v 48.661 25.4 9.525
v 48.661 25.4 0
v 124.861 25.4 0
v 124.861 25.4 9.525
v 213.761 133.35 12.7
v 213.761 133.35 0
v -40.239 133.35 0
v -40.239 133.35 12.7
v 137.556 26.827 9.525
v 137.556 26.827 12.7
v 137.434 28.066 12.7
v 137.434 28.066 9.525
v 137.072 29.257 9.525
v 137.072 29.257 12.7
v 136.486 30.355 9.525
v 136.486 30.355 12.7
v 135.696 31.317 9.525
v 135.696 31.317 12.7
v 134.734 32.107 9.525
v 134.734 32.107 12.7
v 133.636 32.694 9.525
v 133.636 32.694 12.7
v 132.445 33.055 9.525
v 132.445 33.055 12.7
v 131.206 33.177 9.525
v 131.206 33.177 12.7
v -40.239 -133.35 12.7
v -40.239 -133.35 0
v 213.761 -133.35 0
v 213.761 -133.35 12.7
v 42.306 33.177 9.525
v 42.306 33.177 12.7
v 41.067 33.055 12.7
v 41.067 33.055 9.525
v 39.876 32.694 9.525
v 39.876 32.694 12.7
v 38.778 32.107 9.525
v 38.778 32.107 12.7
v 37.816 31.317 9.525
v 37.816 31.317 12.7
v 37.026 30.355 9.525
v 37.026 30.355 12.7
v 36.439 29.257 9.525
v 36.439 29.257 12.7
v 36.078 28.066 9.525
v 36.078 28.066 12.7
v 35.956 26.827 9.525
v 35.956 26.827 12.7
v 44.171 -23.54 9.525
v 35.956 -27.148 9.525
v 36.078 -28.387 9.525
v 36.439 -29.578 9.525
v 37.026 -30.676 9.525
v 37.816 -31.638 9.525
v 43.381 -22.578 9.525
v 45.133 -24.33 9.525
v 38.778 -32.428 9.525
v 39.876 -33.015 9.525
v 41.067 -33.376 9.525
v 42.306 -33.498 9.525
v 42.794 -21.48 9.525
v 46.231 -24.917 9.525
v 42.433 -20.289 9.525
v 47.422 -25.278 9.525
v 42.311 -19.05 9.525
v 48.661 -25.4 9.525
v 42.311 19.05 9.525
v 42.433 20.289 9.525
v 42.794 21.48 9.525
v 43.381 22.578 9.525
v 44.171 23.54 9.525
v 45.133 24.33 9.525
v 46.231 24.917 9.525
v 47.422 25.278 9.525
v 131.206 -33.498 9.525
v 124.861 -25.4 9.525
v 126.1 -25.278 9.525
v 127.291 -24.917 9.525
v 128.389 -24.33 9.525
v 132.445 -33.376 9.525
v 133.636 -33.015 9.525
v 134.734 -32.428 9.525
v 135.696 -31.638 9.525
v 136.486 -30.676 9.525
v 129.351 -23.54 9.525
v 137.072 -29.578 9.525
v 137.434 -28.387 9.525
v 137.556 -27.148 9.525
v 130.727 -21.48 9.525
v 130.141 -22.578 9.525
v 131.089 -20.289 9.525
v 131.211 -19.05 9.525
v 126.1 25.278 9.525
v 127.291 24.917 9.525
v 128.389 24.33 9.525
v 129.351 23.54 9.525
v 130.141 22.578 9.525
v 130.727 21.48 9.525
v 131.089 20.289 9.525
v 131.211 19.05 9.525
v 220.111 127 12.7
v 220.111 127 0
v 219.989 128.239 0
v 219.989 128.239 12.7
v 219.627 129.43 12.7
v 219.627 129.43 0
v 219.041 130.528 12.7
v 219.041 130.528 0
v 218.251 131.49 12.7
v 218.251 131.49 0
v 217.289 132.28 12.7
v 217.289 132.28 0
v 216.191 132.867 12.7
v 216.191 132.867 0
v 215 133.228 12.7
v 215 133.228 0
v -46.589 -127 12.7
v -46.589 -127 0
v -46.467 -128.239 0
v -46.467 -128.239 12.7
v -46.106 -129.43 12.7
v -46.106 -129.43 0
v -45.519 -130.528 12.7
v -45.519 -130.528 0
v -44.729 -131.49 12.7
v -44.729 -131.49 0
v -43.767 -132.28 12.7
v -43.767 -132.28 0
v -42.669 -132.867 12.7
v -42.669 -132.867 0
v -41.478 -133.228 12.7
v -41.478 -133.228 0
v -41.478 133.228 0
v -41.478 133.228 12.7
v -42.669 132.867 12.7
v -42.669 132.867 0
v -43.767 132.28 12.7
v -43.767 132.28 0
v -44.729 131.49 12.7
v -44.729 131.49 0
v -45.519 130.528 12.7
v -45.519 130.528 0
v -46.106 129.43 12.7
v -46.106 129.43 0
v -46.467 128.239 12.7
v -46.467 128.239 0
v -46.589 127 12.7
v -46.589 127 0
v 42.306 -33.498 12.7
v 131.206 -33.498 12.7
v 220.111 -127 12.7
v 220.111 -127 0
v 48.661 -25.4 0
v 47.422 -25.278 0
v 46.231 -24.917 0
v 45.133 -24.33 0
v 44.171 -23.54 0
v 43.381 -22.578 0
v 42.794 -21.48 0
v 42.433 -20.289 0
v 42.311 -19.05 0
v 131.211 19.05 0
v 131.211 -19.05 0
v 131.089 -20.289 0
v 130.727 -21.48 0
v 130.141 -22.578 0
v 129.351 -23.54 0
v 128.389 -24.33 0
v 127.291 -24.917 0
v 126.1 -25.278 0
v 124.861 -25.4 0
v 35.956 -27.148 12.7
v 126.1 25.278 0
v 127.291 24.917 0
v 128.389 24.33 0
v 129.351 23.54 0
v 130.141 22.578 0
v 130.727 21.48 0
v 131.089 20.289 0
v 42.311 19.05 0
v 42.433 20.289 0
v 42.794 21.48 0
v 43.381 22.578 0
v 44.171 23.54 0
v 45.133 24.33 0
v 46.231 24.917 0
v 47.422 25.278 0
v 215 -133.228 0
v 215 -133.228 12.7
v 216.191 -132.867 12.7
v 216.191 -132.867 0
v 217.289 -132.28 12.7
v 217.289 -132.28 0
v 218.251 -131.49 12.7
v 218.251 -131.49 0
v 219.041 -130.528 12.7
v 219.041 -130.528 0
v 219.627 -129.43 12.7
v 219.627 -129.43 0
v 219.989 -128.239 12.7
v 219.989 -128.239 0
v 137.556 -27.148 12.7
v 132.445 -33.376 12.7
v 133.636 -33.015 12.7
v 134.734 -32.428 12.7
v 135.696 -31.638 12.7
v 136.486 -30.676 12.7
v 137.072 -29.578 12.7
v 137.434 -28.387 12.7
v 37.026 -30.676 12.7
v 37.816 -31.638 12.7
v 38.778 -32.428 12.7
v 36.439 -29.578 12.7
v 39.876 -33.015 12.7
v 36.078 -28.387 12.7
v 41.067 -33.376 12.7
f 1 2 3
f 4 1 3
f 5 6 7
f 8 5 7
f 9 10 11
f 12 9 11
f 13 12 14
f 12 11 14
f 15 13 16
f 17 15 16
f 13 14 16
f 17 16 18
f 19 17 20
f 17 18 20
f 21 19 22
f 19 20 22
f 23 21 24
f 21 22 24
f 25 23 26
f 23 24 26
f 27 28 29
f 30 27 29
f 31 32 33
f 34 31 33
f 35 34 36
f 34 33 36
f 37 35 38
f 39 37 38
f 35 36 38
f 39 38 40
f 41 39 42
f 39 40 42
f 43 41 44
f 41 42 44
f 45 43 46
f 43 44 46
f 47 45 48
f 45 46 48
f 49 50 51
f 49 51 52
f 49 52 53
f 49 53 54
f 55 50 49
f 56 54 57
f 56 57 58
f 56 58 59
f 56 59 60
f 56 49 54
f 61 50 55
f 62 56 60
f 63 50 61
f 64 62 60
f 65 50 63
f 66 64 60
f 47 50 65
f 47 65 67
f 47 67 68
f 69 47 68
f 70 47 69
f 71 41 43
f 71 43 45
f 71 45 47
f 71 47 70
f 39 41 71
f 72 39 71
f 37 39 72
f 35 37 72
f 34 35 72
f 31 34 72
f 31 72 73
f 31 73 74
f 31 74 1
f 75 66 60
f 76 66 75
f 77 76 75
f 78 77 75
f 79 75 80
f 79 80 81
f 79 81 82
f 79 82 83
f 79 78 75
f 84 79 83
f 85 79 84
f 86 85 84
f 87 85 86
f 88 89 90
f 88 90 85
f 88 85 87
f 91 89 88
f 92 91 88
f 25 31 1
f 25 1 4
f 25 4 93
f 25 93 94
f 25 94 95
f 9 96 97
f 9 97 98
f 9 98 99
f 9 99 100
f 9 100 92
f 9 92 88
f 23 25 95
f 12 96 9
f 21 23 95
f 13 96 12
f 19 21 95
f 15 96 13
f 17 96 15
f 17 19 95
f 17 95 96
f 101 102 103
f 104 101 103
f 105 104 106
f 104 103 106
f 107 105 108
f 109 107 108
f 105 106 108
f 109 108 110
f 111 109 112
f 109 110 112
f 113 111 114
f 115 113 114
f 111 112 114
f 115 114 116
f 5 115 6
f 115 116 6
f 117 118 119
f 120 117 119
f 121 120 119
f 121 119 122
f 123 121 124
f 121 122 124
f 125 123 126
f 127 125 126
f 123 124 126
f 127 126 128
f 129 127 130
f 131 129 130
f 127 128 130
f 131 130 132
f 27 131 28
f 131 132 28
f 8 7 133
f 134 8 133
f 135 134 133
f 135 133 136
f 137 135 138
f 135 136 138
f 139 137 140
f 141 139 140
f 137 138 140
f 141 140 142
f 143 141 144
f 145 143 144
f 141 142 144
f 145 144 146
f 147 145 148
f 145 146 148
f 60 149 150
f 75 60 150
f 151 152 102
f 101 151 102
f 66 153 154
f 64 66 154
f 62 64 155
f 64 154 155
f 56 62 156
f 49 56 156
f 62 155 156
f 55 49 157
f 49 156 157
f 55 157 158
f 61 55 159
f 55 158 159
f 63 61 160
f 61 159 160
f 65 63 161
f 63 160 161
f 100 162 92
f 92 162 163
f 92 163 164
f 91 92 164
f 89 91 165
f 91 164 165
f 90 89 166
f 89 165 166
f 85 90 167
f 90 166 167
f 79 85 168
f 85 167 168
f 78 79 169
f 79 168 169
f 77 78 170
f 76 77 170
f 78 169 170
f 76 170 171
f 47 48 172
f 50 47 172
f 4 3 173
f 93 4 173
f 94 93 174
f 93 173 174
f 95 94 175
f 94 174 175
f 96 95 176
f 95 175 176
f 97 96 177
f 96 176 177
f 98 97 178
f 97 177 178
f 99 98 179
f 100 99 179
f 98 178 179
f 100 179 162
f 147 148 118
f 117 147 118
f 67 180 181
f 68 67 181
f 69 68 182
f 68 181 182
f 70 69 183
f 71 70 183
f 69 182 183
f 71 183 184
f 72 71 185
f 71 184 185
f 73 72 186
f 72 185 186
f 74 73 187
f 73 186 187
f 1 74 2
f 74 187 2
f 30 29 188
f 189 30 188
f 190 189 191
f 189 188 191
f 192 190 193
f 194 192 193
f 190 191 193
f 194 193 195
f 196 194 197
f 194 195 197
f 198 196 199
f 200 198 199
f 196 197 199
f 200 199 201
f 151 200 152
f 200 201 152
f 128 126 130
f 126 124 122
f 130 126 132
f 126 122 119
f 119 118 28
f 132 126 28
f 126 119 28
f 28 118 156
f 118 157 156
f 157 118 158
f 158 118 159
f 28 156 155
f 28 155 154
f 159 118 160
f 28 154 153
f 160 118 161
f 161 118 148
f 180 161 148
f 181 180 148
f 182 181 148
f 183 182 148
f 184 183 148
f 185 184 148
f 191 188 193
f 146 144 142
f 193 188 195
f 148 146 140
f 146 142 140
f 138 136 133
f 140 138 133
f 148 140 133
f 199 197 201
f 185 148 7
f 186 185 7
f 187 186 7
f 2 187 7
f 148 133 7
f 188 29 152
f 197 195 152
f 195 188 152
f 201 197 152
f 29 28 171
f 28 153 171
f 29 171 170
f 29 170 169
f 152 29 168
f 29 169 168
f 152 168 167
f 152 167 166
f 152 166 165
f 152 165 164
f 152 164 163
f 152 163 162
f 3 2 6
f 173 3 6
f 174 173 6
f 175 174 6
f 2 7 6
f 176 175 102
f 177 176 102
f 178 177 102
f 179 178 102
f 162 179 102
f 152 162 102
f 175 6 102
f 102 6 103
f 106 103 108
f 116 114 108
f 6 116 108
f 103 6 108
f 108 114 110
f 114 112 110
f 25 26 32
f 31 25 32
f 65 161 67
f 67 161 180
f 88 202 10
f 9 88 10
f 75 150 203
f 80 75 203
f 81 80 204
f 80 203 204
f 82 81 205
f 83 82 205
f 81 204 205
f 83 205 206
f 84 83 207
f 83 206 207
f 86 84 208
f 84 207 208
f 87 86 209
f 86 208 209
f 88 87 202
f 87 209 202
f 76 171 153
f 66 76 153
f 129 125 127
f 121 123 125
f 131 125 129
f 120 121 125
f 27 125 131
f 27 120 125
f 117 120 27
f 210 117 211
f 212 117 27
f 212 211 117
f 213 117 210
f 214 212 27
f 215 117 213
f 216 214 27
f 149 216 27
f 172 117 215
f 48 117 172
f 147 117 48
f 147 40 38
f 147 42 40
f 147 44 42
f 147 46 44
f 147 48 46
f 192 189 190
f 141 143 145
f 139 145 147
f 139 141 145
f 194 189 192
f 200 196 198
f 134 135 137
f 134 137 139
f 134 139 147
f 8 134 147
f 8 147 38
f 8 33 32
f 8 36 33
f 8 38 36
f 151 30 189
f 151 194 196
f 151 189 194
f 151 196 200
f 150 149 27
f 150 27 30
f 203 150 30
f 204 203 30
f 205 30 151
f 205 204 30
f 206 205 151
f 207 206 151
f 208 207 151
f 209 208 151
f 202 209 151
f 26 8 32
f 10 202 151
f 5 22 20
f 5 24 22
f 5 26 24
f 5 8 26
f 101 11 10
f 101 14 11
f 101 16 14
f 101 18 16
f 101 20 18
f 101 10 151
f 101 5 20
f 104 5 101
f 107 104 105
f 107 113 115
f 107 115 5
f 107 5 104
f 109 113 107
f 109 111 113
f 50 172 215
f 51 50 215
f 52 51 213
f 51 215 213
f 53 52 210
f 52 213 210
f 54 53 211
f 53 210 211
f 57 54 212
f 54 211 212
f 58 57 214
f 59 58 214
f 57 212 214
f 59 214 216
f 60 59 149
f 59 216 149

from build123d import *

# Parameters (mm, degrees)
F1_DEPTH = 12.7
F3_DEPTH = 3.175


with BuildPart() as f1:
    # F0 (on Top) → F1 (new body)
    with BuildSketch(Plane.XY):
        with BuildLine():
            Line((213.760845, 133.35), (-40.239155, 133.35))
            ThreePointArc((-40.239155, 133.35), (-44.729283, 131.490128), (-46.589155, 127))
            Line((-46.589155, 127), (-46.589155, -127))
            ThreePointArc((-46.589155, -127), (-44.729283, -131.490128), (-40.239155, -133.35))
            Line((-40.239155, -133.35), (213.760845, -133.35))
            ThreePointArc((213.760845, -133.35), (218.250973, -131.490128), (220.110845, -127))
            Line((220.110845, -127), (220.110845, 127))
            ThreePointArc((220.110845, 127), (218.250973, 131.490128), (213.760845, 133.35))
        make_face()
        with BuildLine():
            ThreePointArc((42.310845, 19.05), (44.170717, 23.540128), (48.660845, 25.4))
            Line((48.660845, 25.4), (124.860845, 25.4))
            ThreePointArc((124.860845, 25.4), (129.350973, 23.540128), (131.210845, 19.05))
            Line((131.210845, 19.05), (131.210845, -19.05))
            ThreePointArc((131.210845, -19.05), (129.350973, -23.540128), (124.860845, -25.4))
            Line((124.860845, -25.4), (48.660845, -25.4))
            ThreePointArc((48.660845, -25.4), (44.170717, -23.540128), (42.310845, -19.05))
            Line((42.310845, -19.05), (42.310845, 19.05))
        make_face(mode=Mode.SUBTRACT)
    extrude(amount=F1_DEPTH)

    # F2 (on face) → F3 (cut)
    with BuildSketch(Plane.XY.offset(12.7)):
        with BuildLine():
            Line((131.20583, 33.17691), (42.30583, 33.17691))
            ThreePointArc((42.30583, 33.17691), (37.815701, 31.317038), (35.95583, 26.82691))
            Line((35.95583, 26.82691), (35.95583, -27.14809))
            ThreePointArc((35.95583, -27.14809), (37.815701, -31.638218), (42.30583, -33.49809))
            Line((42.30583, -33.49809), (131.20583, -33.49809))
            ThreePointArc((131.20583, -33.49809), (135.695958, -31.638218), (137.55583, -27.14809))
            Line((137.55583, -27.14809), (137.55583, 26.82691))
            ThreePointArc((137.55583, 26.82691), (135.695958, 31.317038), (131.20583, 33.17691))
        make_face()
        with BuildLine():
            Line((124.860845, -25.4), (48.660845, -25.4))
            ThreePointArc((48.660845, -25.4), (44.170717, -23.540128), (42.310845, -19.05))
            Line((42.310845, -19.05), (42.310845, 19.05))
            ThreePointArc((42.310845, 19.05), (44.170717, 23.540128), (48.660845, 25.4))
            Line((48.660845, 25.4), (124.860845, 25.4))
            ThreePointArc((124.860845, 25.4), (129.350973, 23.540128), (131.210845, 19.05))
            Line((131.210845, 19.05), (131.210845, -19.05))
            ThreePointArc((131.210845, -19.05), (129.350973, -23.540128), (124.860845, -25.4))
        make_face(mode=Mode.SUBTRACT)
    extrude(amount=-F3_DEPTH, mode=Mode.SUBTRACT)


solid = f1.part
